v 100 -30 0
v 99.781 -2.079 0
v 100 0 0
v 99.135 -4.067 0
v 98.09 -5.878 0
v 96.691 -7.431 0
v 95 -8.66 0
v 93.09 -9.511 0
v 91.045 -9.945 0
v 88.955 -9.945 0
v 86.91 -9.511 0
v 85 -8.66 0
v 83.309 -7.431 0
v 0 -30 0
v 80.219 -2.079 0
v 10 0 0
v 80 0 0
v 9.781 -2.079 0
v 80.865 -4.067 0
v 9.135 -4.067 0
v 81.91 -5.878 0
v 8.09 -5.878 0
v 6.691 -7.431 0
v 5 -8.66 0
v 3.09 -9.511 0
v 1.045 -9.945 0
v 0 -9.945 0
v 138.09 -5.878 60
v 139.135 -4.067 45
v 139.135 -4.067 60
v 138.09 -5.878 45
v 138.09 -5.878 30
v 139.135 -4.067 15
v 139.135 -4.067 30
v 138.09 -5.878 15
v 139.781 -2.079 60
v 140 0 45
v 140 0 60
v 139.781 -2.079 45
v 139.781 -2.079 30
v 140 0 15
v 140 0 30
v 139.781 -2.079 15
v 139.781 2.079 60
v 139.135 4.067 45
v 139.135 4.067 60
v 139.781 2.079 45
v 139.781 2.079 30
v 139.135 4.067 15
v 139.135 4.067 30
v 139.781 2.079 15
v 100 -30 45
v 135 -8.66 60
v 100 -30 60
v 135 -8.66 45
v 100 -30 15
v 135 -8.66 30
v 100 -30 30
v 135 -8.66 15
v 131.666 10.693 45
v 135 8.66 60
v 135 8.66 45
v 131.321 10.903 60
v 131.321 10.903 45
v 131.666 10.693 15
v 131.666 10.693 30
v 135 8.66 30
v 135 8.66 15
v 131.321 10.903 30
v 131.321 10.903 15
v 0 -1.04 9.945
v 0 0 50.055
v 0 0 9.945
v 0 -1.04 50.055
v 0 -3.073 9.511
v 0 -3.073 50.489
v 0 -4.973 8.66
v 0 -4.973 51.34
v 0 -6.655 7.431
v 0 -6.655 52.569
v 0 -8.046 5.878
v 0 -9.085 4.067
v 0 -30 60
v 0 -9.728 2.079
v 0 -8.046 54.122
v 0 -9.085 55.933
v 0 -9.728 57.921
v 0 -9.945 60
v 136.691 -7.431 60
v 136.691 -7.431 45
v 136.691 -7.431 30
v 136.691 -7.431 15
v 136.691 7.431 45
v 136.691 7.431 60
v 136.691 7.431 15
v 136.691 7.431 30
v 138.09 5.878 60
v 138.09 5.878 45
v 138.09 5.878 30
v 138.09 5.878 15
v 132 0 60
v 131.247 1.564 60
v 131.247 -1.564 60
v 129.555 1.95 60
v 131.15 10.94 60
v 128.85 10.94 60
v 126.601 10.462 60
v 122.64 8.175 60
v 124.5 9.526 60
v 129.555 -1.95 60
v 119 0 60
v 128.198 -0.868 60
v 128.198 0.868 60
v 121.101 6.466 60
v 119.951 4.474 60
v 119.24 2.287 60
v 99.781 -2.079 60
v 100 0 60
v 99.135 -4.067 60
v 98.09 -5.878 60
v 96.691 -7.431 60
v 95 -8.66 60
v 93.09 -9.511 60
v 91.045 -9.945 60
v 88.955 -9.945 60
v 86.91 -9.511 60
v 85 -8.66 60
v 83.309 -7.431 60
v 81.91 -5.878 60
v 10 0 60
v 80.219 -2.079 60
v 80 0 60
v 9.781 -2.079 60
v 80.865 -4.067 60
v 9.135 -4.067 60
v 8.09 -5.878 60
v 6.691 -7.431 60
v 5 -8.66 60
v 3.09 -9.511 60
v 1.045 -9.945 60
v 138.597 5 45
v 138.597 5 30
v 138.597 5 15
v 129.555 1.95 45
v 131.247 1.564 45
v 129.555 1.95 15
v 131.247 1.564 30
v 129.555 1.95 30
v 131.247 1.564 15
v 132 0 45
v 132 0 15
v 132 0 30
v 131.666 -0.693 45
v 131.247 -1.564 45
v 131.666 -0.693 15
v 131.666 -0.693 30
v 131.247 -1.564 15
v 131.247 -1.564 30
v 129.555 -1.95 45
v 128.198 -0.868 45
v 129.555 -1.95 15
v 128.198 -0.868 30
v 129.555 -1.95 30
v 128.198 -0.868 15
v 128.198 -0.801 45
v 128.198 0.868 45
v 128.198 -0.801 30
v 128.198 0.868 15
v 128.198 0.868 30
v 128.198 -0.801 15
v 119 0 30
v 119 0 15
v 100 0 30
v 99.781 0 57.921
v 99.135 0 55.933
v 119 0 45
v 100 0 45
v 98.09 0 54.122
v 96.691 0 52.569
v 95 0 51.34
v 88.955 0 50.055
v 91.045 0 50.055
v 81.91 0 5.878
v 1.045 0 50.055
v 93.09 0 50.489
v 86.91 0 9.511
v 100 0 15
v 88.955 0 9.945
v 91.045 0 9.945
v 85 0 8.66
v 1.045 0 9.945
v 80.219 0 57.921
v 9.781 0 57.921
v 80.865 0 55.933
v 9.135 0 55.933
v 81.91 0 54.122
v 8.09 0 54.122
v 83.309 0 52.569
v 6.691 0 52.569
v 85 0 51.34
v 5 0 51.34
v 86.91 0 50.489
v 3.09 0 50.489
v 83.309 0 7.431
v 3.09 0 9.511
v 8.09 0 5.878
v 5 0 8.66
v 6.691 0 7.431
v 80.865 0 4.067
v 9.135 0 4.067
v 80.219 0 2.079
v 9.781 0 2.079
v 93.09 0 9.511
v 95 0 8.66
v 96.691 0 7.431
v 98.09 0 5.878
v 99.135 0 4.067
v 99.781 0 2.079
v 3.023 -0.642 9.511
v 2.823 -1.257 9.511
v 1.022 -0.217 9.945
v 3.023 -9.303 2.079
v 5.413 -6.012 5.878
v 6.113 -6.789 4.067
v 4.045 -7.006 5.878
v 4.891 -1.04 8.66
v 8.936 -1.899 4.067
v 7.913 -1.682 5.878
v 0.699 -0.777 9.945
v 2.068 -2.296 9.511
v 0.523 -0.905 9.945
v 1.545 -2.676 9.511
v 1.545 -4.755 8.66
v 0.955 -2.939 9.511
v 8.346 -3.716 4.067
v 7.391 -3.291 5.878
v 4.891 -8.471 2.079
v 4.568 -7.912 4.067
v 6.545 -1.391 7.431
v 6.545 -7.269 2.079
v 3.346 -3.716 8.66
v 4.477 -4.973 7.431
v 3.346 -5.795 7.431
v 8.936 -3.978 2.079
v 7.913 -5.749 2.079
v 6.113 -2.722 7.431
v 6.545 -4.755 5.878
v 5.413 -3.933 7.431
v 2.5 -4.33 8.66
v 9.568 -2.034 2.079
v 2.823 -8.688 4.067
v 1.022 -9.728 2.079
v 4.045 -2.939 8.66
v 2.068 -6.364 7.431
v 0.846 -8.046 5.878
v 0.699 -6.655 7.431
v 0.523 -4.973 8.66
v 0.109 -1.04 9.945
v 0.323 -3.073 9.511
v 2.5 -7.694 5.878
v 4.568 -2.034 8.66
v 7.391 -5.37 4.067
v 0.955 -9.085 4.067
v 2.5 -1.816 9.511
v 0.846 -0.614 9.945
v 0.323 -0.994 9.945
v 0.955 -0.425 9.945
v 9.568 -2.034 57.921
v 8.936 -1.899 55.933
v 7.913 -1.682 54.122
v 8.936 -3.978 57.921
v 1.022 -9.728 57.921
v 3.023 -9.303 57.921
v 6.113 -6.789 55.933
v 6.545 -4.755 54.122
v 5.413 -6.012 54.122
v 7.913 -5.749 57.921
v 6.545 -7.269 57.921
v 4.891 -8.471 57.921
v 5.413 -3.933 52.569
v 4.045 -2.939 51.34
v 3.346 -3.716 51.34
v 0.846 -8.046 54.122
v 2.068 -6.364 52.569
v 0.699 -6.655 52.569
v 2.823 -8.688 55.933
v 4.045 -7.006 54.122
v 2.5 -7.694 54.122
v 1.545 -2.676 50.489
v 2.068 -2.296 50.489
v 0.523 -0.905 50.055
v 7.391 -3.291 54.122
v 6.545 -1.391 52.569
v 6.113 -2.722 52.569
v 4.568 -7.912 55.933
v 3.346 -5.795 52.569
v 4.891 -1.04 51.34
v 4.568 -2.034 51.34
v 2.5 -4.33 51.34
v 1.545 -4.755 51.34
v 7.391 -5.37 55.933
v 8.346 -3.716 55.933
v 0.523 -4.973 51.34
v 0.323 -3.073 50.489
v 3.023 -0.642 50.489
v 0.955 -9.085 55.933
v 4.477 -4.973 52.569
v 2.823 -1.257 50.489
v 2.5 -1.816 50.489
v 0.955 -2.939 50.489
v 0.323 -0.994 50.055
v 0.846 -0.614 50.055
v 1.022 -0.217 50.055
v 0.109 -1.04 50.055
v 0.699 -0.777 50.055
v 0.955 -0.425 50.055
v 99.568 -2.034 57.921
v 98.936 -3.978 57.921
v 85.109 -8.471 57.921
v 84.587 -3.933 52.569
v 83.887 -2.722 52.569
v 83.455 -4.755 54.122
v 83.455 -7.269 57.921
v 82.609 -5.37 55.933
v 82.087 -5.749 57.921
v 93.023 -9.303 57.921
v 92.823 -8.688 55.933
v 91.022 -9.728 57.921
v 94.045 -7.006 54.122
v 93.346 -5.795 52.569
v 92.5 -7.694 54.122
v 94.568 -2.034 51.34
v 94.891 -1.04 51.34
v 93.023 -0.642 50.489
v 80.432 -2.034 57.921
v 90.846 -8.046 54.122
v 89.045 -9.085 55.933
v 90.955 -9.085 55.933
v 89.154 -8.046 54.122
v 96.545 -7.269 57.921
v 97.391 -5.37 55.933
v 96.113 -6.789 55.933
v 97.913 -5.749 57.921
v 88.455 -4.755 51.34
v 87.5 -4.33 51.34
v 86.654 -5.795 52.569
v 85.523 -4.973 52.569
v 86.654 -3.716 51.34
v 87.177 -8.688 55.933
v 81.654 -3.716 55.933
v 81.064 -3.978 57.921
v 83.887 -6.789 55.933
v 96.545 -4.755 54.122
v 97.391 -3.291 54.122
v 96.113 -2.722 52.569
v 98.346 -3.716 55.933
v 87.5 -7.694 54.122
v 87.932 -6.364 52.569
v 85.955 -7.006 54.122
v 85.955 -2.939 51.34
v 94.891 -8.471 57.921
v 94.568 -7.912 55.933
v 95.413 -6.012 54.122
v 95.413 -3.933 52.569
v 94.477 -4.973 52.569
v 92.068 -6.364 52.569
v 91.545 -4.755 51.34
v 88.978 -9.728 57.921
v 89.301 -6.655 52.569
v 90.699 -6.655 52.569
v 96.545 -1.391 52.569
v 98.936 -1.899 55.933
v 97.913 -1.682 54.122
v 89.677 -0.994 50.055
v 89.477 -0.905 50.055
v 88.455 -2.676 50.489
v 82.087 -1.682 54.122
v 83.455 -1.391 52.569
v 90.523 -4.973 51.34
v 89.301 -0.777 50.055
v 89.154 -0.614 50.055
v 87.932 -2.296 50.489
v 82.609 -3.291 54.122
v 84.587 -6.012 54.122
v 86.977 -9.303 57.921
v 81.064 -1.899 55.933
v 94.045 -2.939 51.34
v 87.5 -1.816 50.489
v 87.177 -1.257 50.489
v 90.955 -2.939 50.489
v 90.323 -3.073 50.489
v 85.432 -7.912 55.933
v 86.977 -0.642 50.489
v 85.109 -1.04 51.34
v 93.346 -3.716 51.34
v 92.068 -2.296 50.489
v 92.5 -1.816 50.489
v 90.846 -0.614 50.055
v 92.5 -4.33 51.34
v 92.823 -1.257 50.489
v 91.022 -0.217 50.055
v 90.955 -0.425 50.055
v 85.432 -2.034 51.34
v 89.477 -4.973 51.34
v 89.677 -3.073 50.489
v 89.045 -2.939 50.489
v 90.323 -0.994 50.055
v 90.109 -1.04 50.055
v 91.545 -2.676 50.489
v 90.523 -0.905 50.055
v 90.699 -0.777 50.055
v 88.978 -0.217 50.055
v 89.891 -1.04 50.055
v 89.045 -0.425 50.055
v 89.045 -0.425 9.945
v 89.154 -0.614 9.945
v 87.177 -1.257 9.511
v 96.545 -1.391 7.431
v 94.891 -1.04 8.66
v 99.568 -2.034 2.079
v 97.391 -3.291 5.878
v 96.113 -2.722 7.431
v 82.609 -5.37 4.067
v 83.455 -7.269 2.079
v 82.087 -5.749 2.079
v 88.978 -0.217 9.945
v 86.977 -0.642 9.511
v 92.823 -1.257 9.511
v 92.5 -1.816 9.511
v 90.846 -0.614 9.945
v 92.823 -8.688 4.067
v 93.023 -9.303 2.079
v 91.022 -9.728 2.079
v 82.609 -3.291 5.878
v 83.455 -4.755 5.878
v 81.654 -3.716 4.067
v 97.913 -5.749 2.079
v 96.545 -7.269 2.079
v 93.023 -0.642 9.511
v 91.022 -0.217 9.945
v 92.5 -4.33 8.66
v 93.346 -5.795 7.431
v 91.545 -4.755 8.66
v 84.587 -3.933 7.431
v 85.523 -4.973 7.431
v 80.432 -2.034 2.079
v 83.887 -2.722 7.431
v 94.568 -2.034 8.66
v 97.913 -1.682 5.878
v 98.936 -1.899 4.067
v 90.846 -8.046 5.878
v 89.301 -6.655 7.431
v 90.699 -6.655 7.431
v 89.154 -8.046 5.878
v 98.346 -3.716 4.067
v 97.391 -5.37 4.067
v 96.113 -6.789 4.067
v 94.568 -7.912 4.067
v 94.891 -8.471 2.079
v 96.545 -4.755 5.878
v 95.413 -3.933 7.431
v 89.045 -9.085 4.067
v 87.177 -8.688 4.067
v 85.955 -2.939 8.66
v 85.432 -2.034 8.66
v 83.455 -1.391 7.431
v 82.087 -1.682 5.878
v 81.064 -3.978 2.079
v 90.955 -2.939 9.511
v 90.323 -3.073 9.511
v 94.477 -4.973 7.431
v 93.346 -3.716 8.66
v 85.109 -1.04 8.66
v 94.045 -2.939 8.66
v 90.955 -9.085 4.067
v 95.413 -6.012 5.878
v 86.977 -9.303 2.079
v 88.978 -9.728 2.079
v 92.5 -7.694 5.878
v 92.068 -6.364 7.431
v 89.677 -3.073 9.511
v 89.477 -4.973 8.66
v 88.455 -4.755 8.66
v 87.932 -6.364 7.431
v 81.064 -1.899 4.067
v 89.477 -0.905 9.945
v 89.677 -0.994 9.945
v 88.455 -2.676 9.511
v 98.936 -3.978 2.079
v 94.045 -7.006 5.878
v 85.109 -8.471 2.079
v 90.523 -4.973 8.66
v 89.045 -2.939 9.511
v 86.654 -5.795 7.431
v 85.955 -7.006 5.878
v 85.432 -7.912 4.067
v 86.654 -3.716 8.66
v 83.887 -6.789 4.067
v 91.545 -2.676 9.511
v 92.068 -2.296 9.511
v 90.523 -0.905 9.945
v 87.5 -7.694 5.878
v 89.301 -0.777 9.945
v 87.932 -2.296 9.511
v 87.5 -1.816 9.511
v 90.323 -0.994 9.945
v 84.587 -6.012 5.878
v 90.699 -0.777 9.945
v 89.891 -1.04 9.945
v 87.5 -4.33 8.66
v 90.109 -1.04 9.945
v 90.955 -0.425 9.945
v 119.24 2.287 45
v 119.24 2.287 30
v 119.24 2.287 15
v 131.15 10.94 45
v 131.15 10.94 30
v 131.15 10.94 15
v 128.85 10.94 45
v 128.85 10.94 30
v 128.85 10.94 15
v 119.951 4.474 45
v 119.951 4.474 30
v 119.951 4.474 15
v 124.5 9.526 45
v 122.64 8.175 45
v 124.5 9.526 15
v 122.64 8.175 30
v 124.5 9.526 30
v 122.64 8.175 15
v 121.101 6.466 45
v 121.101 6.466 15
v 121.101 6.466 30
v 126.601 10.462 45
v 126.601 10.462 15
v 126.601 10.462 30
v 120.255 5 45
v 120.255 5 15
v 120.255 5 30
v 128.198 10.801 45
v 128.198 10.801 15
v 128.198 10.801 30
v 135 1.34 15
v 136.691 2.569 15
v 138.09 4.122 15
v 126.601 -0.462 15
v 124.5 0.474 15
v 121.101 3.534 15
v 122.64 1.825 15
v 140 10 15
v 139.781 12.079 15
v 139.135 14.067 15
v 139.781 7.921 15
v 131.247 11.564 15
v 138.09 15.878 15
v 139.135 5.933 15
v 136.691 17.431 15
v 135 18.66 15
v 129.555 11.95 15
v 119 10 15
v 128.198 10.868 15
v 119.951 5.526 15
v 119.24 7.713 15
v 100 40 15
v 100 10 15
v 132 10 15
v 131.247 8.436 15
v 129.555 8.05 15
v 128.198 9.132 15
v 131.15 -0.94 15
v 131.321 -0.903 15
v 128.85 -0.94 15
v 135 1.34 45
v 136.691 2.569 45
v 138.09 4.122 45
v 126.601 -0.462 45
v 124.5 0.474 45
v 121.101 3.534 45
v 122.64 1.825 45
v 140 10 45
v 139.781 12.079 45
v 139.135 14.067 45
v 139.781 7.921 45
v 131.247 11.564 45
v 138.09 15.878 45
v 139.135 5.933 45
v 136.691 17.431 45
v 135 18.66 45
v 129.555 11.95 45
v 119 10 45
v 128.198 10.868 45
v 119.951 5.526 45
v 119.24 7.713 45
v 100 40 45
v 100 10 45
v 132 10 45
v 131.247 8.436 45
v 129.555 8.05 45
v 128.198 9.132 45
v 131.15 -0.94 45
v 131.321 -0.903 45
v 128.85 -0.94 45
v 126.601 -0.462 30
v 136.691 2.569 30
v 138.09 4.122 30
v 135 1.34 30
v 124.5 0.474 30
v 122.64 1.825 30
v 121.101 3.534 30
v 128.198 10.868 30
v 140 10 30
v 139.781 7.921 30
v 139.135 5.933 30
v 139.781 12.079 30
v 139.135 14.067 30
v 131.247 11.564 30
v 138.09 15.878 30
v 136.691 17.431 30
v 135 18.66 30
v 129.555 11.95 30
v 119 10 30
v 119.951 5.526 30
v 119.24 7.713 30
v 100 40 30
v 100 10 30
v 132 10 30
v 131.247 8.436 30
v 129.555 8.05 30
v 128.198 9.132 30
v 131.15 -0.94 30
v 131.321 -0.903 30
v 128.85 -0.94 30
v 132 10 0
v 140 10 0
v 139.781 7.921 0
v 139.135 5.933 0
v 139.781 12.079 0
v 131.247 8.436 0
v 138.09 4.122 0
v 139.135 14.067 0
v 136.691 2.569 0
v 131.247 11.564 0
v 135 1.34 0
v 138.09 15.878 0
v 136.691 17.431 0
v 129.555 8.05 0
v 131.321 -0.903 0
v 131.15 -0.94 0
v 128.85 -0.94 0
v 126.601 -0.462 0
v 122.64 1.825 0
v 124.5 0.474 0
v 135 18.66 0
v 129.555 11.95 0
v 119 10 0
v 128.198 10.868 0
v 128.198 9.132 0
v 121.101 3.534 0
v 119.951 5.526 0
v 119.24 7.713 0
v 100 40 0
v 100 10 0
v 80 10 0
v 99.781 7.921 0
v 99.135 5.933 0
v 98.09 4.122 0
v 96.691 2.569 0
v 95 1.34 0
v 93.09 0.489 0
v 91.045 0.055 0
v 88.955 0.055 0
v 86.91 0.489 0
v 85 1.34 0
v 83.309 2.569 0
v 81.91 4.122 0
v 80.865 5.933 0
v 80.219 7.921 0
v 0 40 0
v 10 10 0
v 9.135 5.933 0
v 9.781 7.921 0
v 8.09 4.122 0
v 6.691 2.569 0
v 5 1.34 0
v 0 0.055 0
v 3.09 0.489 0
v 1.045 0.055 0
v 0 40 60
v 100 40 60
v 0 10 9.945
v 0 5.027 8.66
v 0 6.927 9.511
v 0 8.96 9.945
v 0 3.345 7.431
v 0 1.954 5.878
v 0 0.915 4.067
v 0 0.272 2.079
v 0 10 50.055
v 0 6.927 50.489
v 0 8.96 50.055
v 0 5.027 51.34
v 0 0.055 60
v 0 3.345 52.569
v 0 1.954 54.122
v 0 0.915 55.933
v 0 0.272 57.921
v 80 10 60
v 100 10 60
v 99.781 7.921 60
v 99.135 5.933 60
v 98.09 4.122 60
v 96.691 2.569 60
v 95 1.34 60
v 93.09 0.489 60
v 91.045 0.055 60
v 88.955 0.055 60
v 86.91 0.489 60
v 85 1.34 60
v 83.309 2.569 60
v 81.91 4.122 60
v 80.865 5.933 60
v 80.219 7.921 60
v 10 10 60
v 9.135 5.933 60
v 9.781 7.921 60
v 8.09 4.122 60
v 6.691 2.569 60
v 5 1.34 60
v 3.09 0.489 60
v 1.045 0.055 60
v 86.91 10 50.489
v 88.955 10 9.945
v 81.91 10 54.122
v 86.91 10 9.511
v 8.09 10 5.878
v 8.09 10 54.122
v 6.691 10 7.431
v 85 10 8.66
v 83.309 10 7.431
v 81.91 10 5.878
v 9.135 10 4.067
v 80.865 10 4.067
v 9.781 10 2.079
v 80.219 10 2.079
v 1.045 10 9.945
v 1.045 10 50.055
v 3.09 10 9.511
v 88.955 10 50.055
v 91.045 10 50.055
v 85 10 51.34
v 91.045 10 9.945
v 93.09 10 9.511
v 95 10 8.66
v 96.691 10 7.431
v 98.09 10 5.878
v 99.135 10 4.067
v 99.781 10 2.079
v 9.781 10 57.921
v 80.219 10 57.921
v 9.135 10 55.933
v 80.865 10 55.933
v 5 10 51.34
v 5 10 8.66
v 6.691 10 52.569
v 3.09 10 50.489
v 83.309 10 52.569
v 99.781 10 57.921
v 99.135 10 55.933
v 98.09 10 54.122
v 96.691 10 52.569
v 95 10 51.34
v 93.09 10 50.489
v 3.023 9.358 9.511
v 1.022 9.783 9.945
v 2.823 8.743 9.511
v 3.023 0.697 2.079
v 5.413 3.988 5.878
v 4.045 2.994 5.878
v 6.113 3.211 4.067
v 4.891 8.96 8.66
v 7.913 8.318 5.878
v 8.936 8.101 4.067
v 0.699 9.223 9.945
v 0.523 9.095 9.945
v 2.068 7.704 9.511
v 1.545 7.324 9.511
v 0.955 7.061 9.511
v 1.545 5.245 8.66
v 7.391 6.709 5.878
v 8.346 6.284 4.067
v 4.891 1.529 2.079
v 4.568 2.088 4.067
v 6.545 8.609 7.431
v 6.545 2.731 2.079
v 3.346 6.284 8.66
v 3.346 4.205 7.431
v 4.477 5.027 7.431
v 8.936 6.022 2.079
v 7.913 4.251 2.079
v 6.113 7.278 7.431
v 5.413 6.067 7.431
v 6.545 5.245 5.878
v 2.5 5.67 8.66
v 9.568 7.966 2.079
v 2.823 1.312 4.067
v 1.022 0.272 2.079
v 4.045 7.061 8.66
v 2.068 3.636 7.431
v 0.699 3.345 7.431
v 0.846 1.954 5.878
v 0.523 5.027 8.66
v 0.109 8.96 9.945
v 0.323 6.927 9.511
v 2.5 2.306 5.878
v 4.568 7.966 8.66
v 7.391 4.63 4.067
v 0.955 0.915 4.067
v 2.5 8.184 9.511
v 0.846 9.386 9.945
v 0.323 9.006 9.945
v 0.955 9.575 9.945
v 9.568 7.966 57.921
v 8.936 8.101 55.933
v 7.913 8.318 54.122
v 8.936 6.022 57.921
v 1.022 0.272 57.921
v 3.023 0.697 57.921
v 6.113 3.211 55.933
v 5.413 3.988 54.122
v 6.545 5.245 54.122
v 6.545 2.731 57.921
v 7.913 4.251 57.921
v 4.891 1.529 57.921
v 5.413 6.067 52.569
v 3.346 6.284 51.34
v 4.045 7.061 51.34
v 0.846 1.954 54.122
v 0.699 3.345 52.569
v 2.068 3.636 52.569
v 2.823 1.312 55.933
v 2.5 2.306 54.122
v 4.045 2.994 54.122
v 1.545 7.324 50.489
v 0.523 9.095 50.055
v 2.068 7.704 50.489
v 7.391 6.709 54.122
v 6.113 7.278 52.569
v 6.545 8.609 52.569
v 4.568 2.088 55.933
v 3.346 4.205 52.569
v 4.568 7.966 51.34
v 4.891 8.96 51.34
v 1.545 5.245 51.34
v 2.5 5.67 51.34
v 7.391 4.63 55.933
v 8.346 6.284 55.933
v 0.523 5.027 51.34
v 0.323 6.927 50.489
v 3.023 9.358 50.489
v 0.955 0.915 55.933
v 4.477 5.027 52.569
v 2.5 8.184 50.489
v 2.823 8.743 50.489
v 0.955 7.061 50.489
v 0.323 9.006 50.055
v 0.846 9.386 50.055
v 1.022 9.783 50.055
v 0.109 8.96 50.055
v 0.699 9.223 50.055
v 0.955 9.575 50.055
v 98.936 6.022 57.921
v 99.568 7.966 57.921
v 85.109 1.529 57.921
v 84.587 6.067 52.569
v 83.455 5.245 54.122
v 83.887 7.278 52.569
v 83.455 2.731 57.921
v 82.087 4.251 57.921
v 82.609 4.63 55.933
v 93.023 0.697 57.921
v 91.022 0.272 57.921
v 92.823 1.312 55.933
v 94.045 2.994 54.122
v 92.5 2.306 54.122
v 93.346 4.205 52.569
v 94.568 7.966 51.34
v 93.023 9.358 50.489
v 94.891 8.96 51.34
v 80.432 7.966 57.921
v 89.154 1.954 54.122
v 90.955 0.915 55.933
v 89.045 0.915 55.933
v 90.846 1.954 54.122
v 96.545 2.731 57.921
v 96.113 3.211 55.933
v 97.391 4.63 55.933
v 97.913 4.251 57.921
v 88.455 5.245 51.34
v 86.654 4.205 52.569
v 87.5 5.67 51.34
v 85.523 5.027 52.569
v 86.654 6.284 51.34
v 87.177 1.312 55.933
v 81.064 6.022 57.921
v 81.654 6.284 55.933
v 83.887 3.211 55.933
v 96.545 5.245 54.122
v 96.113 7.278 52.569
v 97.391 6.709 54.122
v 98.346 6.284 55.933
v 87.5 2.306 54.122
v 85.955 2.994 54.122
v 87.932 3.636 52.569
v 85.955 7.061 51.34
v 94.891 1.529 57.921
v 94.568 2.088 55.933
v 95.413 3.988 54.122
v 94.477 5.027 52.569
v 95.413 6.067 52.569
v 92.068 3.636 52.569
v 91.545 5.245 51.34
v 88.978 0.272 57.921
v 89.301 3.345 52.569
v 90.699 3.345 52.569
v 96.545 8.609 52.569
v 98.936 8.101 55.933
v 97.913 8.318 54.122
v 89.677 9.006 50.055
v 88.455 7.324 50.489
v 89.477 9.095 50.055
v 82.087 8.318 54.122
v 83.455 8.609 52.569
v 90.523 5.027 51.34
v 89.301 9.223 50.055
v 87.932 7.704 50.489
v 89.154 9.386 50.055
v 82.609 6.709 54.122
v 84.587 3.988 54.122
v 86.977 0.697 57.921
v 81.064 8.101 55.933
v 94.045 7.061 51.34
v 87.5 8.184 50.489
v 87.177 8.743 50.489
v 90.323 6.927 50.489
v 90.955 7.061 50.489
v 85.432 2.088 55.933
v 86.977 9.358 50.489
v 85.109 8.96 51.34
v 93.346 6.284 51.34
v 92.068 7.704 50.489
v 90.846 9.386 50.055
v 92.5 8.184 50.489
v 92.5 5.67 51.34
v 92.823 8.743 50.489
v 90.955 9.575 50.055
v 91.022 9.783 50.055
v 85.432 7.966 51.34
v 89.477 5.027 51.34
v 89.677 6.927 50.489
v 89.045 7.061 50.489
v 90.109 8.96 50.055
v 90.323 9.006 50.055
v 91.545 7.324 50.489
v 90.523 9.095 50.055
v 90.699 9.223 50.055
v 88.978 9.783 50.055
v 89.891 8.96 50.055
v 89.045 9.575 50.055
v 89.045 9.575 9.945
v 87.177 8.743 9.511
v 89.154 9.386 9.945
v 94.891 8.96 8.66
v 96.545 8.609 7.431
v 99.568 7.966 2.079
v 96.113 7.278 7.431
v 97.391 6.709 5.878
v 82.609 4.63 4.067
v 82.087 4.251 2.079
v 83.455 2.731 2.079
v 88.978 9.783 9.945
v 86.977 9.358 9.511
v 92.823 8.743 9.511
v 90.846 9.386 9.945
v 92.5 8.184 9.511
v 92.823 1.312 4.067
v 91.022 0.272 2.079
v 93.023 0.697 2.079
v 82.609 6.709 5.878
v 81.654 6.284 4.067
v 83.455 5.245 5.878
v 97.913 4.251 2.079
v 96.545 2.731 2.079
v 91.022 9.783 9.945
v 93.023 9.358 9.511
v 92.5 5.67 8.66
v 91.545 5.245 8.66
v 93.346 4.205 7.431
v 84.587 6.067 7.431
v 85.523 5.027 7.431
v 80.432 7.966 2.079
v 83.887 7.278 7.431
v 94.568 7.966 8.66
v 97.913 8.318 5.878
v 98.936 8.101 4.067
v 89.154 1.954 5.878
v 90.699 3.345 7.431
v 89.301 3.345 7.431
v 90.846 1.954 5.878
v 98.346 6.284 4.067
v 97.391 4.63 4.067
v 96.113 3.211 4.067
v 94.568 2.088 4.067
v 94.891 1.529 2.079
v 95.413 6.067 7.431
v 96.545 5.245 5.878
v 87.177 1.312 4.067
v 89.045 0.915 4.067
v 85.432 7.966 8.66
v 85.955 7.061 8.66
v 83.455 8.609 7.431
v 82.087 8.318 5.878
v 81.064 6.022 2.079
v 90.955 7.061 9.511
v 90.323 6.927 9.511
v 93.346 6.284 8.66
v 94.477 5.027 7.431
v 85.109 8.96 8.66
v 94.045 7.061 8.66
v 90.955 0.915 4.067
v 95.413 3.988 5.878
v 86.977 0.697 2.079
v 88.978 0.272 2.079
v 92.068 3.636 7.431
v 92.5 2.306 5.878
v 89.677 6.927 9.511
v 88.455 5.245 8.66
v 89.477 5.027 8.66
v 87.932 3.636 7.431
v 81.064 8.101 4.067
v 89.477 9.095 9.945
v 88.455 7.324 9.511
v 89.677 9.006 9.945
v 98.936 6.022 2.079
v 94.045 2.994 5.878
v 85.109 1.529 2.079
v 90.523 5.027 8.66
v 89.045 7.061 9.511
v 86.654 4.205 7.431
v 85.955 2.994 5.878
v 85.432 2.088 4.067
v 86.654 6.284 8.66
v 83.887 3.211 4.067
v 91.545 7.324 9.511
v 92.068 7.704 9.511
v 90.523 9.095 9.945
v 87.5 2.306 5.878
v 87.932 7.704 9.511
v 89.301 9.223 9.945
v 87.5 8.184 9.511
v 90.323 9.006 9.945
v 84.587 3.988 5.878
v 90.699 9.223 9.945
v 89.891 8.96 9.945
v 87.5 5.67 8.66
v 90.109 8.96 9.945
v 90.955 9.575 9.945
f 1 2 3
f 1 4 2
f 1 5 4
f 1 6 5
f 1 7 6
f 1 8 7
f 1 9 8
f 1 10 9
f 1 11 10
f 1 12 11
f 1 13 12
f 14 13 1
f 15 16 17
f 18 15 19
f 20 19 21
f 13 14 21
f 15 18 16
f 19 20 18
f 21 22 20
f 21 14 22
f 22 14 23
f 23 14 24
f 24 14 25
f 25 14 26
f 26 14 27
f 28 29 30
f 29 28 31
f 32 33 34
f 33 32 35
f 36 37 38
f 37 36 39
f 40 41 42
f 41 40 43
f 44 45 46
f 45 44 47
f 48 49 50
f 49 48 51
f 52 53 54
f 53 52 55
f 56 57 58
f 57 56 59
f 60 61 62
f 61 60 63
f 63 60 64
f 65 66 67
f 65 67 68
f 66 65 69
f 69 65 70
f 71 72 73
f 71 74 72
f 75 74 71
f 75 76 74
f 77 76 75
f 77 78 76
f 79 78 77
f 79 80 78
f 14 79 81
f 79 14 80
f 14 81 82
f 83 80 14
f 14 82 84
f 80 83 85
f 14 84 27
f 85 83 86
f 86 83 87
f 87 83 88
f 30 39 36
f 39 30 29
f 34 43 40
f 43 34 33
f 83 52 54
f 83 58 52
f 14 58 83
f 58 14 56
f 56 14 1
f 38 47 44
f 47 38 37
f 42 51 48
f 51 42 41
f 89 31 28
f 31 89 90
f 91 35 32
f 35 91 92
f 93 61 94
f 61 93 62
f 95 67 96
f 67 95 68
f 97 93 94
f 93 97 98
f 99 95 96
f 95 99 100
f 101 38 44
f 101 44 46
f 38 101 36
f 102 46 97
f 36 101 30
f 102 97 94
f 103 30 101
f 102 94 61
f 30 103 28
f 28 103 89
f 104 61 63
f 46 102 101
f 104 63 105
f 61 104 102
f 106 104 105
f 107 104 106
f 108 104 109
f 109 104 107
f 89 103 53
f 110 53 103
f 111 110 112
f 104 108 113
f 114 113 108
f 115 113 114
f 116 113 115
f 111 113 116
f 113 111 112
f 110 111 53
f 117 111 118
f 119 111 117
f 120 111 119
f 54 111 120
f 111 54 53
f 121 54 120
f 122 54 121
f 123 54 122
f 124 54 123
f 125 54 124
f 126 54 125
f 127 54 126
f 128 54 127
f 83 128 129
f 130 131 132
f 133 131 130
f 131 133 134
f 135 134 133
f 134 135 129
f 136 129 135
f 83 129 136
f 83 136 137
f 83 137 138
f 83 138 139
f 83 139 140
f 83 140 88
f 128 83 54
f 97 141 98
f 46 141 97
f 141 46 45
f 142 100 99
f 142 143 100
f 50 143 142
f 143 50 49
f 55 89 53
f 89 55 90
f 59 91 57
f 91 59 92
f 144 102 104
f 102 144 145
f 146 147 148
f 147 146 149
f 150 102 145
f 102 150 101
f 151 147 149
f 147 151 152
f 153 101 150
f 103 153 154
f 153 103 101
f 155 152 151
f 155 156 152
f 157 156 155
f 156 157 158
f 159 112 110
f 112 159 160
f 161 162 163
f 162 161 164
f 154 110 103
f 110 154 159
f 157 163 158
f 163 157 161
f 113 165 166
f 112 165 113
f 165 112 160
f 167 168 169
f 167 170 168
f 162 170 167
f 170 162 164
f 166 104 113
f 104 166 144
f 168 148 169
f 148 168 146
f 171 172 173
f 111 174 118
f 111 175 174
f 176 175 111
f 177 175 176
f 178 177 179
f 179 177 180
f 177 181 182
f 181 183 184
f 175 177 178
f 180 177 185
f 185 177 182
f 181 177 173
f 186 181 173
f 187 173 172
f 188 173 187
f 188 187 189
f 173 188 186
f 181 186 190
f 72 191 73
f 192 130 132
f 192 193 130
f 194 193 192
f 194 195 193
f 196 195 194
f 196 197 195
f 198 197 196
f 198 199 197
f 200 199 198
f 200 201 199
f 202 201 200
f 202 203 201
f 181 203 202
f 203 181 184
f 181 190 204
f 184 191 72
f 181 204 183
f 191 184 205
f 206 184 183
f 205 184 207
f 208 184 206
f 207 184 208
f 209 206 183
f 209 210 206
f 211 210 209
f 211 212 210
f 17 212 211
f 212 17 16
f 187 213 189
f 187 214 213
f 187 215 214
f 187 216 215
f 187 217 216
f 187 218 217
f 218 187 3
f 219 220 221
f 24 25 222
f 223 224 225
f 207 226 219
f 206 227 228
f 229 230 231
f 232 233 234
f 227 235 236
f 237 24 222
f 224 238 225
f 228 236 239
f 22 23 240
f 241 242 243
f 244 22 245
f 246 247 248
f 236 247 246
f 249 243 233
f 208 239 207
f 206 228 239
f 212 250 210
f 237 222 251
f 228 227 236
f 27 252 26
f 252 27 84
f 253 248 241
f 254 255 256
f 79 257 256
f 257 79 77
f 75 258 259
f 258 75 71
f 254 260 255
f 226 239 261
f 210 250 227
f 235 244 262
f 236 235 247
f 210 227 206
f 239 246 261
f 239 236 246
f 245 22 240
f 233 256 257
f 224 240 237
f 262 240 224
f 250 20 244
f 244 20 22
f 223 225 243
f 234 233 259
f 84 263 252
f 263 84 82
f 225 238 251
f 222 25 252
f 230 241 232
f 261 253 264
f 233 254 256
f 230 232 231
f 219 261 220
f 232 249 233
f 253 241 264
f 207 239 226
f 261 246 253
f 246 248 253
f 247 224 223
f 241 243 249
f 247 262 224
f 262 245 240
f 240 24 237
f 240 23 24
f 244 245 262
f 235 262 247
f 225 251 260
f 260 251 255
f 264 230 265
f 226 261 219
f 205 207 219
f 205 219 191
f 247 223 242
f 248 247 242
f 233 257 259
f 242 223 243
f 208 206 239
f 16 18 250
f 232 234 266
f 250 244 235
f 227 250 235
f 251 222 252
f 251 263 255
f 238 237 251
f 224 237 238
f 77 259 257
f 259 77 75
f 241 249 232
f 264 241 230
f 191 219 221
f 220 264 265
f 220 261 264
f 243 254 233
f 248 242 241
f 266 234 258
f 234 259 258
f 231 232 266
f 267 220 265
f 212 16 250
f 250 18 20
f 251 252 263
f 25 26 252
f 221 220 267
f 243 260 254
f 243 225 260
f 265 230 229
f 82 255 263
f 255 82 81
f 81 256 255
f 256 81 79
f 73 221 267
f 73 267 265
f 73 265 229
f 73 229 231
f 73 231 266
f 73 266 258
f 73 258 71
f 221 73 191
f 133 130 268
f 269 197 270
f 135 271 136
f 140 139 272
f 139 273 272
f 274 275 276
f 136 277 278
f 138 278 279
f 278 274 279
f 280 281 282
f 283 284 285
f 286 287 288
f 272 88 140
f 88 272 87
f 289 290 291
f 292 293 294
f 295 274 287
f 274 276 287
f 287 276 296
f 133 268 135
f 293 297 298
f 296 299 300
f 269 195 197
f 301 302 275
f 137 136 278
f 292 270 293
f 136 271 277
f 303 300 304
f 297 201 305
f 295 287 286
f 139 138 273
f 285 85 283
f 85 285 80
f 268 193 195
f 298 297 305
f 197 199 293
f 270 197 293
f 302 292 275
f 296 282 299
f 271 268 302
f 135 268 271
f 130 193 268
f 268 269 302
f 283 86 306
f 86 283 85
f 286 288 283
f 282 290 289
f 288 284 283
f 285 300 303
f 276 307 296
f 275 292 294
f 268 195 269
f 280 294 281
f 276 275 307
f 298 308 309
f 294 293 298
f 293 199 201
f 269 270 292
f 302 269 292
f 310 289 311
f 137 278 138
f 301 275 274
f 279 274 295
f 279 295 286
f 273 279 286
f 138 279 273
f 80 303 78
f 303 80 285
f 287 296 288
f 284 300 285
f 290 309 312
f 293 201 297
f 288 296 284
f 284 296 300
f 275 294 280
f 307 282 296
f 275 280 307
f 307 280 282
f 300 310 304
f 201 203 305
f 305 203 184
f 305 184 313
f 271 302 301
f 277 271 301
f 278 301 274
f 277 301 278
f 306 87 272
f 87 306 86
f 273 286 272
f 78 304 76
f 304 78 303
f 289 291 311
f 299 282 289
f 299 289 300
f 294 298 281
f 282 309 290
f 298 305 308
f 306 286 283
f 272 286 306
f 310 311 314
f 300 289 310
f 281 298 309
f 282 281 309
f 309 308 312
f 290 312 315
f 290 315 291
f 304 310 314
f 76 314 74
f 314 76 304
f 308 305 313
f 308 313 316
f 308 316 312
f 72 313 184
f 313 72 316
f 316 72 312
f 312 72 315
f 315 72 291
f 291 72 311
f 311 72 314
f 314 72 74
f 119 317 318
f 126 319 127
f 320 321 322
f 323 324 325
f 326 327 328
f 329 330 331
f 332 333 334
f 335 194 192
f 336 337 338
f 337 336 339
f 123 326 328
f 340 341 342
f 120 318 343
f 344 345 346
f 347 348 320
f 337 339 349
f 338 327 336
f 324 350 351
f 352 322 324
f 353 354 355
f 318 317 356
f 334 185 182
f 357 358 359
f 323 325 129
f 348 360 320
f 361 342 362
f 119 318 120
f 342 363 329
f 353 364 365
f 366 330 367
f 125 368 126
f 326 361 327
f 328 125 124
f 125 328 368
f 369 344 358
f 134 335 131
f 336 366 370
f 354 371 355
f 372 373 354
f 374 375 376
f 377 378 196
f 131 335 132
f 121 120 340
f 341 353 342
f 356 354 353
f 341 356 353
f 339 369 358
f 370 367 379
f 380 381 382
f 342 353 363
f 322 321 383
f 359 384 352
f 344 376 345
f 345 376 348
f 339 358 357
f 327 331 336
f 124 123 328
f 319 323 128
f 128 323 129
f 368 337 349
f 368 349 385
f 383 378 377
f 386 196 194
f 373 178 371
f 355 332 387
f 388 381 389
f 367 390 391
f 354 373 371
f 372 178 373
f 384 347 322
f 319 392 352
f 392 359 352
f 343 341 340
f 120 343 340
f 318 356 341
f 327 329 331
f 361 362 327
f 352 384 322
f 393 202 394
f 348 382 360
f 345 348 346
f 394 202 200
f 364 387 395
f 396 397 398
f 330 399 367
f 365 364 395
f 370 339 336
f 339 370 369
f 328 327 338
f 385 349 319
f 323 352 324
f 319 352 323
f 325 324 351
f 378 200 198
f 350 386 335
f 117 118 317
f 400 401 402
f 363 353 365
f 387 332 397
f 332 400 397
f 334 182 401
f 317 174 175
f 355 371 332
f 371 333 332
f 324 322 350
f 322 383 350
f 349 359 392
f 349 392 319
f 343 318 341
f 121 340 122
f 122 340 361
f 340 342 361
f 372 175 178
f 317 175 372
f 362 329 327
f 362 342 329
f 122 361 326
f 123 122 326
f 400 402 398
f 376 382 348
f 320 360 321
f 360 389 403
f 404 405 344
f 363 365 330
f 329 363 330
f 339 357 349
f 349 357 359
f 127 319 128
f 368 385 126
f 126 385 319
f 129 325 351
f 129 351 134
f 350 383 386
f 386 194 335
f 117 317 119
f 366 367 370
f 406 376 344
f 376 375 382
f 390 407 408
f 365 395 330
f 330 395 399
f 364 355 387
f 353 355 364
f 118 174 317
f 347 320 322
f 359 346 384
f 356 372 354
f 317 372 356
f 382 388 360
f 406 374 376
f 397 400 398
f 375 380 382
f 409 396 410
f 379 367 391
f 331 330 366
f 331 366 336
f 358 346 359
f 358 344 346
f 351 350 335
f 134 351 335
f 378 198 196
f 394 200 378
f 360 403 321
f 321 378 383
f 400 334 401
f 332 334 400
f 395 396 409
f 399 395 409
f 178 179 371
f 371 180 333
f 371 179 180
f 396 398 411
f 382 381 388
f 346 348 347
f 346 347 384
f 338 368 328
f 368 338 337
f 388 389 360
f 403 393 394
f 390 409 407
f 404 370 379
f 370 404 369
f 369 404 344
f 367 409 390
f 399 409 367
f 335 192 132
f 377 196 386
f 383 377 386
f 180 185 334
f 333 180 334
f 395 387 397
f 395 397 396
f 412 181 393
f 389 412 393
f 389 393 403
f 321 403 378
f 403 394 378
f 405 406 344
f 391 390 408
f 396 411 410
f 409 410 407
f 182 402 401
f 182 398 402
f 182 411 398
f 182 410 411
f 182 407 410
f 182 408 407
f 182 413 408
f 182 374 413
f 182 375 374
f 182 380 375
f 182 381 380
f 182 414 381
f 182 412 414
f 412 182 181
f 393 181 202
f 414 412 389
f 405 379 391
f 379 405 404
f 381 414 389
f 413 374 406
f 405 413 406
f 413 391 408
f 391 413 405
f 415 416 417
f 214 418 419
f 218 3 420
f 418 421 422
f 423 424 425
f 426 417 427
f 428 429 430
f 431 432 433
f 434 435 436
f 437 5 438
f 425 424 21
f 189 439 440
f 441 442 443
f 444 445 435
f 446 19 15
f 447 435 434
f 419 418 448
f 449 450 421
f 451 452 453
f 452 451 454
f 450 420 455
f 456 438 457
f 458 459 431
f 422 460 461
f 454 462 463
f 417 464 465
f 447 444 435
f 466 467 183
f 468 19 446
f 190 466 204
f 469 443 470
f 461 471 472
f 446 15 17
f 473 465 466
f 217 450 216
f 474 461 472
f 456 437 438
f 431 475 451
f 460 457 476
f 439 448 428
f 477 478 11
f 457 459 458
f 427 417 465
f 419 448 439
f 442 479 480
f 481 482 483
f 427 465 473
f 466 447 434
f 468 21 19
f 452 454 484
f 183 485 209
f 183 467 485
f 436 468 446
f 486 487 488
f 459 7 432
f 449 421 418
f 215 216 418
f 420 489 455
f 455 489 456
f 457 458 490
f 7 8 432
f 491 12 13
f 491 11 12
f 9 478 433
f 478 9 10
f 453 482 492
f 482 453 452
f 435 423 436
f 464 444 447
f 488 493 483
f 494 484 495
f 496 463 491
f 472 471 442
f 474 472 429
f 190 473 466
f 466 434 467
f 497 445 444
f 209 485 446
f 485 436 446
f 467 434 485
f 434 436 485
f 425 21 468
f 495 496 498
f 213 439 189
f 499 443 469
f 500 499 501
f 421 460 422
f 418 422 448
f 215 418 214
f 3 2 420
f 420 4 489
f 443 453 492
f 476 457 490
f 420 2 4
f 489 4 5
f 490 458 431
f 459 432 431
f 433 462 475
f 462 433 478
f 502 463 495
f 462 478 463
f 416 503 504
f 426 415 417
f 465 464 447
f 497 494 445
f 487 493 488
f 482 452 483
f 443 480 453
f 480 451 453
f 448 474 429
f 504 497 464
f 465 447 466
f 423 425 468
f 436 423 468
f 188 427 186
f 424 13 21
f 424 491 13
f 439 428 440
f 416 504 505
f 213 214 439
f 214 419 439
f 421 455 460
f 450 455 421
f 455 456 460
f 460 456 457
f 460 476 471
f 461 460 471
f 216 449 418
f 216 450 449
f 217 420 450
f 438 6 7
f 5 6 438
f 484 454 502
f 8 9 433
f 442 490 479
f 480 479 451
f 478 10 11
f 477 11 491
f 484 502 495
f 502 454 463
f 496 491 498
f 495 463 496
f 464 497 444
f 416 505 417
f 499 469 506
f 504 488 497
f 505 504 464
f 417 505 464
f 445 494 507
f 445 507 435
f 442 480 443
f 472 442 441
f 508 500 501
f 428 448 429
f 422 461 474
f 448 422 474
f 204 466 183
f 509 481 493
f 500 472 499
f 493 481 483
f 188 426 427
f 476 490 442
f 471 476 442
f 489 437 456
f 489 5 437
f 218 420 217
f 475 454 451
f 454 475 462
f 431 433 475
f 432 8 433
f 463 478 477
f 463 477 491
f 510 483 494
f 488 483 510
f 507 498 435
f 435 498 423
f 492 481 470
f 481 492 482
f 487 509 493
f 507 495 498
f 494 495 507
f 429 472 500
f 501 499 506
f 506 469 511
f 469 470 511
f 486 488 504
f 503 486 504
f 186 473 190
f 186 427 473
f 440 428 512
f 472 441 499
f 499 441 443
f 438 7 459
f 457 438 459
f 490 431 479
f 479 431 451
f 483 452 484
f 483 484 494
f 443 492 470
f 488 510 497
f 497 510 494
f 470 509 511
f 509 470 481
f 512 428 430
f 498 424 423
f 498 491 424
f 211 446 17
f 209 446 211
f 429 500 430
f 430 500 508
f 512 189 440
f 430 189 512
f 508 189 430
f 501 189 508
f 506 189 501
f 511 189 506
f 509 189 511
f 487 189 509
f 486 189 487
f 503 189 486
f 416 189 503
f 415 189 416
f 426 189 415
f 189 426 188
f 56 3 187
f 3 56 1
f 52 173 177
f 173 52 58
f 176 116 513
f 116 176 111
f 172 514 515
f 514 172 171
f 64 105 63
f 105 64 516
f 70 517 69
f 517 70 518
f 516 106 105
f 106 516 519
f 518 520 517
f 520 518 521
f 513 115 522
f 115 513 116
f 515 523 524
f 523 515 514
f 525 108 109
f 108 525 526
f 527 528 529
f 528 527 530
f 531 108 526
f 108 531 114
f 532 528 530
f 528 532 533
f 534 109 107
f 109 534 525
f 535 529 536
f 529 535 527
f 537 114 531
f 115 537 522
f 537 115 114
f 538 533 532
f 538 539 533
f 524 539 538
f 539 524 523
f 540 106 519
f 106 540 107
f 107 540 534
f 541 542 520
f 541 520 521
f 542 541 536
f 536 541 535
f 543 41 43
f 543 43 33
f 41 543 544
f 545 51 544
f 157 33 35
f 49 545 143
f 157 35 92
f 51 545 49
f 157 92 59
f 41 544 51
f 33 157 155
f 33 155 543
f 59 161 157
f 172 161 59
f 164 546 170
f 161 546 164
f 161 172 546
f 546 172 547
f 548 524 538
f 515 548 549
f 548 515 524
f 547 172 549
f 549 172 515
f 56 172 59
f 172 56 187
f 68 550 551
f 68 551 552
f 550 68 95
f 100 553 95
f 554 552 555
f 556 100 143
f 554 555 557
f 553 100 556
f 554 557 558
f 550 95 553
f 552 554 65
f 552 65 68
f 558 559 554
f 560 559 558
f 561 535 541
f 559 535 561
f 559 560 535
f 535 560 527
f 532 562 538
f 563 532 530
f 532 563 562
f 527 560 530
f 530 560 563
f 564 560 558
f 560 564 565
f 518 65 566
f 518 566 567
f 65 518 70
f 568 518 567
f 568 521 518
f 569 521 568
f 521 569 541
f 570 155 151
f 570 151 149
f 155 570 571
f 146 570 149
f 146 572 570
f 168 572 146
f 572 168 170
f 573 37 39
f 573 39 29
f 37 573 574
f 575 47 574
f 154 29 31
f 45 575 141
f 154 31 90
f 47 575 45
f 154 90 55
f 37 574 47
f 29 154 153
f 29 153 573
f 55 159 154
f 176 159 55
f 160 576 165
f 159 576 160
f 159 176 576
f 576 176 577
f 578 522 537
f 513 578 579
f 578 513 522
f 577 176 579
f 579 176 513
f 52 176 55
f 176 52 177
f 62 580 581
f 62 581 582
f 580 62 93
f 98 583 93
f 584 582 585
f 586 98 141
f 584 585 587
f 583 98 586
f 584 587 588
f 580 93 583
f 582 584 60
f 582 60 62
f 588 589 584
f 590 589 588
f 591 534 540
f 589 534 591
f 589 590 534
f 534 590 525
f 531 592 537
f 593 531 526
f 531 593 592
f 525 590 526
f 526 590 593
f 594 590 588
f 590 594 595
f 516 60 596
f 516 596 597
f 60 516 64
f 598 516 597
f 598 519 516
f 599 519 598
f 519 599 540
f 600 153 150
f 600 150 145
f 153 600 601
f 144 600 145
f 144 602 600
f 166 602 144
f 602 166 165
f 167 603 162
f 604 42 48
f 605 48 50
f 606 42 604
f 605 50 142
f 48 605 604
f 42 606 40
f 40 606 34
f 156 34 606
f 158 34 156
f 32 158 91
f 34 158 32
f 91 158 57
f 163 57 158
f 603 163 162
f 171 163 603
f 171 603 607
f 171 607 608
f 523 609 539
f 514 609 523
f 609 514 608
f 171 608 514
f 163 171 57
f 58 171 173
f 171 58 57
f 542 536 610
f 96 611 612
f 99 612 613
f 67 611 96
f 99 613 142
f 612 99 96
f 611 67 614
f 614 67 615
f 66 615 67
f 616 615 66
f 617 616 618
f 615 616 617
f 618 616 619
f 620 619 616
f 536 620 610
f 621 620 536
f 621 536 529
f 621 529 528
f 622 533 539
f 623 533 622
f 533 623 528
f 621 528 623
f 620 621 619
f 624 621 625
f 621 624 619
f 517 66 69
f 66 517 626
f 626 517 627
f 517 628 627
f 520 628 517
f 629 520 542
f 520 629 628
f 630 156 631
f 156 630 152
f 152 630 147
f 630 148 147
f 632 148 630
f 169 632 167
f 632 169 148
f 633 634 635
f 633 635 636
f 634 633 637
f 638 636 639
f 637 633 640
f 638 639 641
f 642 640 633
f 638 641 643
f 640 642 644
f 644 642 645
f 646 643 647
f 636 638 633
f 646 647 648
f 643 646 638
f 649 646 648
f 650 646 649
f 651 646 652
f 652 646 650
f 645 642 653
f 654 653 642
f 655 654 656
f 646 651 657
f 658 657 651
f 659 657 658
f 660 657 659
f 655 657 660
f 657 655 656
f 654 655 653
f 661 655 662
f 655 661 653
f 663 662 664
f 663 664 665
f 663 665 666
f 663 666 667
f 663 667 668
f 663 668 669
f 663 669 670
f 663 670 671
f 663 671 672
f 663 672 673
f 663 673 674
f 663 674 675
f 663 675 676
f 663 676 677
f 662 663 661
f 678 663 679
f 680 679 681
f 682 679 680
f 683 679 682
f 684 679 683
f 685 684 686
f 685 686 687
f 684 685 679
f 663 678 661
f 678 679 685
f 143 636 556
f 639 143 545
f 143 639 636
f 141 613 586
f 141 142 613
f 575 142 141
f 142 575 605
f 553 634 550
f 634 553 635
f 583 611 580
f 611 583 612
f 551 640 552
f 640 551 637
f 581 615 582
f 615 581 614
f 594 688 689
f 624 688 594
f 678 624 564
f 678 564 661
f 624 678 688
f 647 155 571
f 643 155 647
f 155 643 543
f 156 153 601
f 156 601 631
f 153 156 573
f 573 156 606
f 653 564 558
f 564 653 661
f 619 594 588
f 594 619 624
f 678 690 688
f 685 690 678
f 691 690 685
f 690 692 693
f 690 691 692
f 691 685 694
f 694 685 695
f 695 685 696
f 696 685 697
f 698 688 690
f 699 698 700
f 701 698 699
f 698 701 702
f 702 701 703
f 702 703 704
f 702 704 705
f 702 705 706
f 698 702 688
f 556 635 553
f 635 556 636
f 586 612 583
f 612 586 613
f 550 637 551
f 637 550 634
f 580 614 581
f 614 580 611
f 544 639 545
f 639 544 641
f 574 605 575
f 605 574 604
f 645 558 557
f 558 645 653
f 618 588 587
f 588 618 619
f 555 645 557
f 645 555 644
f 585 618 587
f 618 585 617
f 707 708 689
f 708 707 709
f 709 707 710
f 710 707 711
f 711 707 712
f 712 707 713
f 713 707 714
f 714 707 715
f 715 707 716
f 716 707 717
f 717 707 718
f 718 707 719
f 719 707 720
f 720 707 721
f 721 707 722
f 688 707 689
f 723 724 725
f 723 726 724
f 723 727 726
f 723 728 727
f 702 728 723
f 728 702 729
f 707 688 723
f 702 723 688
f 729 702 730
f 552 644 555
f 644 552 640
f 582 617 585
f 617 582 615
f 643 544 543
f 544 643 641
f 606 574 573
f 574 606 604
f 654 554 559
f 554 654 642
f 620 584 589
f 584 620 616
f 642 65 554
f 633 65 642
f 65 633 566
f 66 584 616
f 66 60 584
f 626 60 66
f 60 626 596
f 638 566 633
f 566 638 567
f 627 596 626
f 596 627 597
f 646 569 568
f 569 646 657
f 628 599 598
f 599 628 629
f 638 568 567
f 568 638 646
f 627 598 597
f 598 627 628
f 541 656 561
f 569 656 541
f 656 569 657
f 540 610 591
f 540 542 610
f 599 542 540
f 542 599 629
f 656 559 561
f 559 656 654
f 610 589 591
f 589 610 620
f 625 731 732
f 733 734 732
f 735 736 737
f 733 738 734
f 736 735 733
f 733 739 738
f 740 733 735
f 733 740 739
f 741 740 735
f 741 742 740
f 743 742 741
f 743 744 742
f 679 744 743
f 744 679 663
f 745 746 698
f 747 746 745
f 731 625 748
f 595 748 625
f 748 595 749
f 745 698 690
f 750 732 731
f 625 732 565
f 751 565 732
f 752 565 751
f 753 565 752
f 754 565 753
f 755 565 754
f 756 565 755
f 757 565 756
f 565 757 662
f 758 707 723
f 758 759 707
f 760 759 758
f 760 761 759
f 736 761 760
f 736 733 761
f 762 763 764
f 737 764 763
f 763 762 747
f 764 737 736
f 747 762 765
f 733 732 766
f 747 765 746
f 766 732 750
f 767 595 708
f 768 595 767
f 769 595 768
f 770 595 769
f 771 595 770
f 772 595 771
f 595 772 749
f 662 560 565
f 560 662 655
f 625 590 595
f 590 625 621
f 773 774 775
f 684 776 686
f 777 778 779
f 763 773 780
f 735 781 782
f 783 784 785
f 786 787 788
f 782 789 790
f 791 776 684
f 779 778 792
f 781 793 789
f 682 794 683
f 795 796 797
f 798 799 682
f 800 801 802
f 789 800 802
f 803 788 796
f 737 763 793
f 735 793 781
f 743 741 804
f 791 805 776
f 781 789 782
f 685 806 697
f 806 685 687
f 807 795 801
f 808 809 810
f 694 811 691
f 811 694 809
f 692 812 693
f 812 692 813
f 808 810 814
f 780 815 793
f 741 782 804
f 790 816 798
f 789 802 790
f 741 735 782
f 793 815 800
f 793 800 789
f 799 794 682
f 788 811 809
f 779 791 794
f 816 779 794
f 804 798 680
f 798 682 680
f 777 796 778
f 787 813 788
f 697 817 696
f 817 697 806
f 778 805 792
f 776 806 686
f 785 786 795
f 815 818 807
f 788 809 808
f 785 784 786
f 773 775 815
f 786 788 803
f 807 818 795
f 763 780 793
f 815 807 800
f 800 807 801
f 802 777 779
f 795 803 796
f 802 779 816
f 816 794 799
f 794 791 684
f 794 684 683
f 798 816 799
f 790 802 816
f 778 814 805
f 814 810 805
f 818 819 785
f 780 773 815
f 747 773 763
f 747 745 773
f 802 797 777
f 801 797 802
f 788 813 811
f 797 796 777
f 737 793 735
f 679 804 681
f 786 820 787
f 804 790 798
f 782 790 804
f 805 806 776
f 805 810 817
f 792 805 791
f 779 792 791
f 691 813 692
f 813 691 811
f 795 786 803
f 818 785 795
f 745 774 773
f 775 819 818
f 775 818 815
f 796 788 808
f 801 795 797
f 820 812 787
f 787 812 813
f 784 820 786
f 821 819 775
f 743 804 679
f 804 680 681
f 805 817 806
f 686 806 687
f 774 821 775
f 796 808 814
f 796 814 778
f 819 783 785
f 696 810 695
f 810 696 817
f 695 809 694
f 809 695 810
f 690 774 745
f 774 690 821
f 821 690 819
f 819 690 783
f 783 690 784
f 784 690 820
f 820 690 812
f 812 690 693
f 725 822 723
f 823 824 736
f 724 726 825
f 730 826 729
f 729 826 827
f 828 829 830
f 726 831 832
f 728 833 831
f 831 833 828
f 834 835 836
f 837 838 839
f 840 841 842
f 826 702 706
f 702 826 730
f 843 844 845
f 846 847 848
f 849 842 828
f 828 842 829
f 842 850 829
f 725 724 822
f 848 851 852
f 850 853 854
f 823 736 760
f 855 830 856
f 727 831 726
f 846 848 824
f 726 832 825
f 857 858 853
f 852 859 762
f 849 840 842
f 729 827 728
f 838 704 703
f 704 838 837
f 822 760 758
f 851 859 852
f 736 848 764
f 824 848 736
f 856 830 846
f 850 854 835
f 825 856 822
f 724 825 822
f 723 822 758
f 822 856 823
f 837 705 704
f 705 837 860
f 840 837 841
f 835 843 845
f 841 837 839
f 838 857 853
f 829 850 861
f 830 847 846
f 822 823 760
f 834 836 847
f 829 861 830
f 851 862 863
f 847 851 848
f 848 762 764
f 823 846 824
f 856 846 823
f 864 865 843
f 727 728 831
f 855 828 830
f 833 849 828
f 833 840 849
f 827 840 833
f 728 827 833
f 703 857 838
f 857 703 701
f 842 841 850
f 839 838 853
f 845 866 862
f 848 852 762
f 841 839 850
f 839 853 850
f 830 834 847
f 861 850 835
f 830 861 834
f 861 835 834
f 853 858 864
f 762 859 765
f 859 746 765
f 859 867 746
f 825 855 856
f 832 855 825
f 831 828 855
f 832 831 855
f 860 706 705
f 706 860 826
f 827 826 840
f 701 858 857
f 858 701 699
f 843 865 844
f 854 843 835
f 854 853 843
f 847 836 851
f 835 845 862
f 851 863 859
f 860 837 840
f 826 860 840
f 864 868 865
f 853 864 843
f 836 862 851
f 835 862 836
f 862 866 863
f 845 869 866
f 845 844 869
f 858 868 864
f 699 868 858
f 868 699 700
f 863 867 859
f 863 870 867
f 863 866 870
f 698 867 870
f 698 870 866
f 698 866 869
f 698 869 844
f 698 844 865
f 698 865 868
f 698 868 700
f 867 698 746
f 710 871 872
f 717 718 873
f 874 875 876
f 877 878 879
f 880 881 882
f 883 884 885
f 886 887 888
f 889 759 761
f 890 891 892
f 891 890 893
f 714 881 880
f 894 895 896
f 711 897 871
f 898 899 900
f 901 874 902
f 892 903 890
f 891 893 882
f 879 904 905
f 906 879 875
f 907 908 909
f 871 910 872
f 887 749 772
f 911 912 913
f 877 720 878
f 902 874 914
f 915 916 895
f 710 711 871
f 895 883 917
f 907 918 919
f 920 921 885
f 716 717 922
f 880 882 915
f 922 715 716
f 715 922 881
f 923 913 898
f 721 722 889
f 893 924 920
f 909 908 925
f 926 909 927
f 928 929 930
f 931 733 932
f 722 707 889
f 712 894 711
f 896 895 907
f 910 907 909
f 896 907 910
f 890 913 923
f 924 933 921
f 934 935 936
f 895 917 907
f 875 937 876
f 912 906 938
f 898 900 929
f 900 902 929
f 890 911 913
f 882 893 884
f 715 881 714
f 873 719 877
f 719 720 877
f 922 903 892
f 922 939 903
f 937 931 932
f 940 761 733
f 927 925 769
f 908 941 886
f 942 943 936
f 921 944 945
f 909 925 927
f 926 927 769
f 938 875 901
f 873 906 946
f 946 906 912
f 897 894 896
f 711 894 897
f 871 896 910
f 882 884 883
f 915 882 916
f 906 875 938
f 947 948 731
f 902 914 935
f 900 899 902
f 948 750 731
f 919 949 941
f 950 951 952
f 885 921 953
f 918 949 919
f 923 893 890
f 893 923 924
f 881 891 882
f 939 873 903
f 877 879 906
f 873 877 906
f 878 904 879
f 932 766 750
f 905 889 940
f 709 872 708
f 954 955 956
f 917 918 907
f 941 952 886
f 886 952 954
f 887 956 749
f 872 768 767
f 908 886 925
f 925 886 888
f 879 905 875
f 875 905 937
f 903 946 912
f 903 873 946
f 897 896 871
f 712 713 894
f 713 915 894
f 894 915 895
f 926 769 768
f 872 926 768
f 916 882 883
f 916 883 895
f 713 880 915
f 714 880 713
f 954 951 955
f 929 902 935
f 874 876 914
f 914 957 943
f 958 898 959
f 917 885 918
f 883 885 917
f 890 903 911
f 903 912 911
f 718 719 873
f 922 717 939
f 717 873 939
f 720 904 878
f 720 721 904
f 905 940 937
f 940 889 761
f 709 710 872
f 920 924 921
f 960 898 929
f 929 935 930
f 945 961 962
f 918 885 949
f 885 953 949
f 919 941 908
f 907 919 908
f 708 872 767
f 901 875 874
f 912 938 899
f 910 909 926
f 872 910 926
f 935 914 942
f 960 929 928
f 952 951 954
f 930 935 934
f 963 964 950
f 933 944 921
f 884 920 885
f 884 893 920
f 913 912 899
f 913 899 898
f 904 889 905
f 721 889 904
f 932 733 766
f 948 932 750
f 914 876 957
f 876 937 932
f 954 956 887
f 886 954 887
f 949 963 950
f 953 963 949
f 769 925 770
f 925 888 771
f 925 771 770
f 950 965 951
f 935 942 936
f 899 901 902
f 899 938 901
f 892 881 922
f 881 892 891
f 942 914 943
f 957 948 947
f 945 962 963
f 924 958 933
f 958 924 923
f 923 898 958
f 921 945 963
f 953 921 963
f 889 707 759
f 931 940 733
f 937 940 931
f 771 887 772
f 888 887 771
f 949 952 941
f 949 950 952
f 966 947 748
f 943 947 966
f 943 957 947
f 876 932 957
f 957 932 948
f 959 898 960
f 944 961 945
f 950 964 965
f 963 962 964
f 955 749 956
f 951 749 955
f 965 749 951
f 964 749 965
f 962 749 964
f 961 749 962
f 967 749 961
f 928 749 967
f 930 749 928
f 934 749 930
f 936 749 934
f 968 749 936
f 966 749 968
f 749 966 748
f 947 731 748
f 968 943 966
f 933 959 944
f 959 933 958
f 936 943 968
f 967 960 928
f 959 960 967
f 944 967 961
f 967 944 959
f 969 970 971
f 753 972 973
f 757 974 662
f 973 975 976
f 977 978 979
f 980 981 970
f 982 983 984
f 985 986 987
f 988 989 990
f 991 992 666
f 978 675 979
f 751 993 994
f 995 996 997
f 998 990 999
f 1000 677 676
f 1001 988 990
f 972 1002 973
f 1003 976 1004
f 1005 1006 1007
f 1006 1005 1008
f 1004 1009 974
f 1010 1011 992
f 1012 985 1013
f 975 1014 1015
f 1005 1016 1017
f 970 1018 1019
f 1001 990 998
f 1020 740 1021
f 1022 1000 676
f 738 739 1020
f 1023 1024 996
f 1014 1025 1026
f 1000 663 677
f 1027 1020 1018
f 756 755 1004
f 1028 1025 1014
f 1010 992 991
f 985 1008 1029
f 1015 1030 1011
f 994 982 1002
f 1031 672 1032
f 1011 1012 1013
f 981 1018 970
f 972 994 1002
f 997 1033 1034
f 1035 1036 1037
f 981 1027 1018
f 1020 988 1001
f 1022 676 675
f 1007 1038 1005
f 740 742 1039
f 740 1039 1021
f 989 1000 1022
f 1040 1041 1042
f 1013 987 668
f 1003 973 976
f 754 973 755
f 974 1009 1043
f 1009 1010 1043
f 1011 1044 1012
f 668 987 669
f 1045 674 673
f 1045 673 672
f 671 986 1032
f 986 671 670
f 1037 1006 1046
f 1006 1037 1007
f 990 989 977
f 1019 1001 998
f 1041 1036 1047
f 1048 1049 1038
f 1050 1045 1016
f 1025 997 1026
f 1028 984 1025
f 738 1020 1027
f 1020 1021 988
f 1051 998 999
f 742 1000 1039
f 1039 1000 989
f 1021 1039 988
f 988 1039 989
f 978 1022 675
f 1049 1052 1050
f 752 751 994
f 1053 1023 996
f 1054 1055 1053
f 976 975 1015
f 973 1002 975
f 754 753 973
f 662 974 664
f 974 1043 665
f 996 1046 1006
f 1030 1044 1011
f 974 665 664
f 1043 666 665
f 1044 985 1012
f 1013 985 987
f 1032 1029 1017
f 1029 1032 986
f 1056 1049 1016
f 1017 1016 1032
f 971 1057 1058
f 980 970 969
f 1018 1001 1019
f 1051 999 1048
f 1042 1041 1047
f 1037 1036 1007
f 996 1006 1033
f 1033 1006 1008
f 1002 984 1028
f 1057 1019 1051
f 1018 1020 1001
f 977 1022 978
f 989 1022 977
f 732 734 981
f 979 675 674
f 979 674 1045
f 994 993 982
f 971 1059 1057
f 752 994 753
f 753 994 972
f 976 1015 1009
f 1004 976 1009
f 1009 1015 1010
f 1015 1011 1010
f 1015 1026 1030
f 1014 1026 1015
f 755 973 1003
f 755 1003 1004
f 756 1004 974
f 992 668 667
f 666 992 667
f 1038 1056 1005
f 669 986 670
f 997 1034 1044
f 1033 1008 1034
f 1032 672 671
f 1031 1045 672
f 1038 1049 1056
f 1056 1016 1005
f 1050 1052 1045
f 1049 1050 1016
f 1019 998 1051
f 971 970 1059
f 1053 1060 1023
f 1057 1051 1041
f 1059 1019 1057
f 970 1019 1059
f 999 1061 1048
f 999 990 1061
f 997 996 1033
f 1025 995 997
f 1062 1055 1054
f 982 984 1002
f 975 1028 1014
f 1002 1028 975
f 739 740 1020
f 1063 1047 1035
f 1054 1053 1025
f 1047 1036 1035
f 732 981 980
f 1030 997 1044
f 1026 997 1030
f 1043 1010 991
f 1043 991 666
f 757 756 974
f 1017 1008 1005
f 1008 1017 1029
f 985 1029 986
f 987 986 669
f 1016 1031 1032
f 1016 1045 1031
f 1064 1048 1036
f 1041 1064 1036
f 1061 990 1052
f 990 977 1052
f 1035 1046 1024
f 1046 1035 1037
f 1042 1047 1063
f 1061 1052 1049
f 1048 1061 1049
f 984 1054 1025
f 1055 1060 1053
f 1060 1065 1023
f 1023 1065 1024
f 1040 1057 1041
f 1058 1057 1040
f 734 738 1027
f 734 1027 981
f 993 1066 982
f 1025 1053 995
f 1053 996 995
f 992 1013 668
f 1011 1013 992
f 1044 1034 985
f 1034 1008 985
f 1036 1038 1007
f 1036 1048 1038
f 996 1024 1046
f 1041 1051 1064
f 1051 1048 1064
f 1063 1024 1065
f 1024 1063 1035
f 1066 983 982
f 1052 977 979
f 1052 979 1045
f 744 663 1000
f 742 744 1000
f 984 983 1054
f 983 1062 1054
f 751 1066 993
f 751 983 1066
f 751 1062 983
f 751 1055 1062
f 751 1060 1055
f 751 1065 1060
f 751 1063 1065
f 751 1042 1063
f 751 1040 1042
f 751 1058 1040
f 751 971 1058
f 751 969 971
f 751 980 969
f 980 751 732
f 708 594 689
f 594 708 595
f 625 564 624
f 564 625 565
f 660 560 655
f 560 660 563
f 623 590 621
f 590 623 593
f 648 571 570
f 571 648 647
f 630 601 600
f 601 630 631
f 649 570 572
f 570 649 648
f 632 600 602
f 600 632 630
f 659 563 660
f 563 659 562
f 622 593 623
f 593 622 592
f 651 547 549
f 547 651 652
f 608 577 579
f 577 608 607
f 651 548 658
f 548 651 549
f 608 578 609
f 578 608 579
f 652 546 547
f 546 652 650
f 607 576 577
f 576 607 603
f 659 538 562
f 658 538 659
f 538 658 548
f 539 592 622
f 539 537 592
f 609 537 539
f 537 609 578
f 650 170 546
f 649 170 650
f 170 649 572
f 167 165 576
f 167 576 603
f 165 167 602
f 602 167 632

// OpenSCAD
largeur=60;
longueur=100;
hauteur=60;
offset_penture=30;
rayon_penture=10;
rayon_goupille=2;
rayon_enligneur=10;


module corps(largeur=60,longueur=100,hauteur=60,
offset_penture=30,rayon_penture=10,rayon_goupille=2)
{
    difference(){
        hull(){
            translate([0,-largeur/2,0]) cube([longueur,largeur,hauteur]);
            translate([longueur+offset_penture,0,0]) 
                cylinder(hauteur,r=rayon_penture);
            
        }
        translate([longueur+offset_penture,0,-1]) 
            cylinder(hauteur+2,r=rayon_goupille);
    }
}    
 
module masquePentureGauche(longueur,largeur,hauteur,position){
    translate(position){
        translate([0,0,-1]) 
            cube([longueur+1,largeur+2,(hauteur/4)+1]);
        translate([0,0,(hauteur/2)])
            cube([longueur+1,largeur+2,(hauteur/4)]);
        difference(){
        translate([0,largeur/2+1,-1]) cube([longueur+1,largeur/2+1,hauteur+2]);
        translate([offset_penture,largeur/2+1,-2]) 
                cylinder(hauteur+4,r=rayon_penture+1);
        }
    }
}

module masquePentureDroite(longueur,largeur,hauteur,position){
        rotate([180,0,0]) translate([0,0,-hauteur]) masquePentureGauche(longueur,largeur,hauteur,position);
    }

    //corps();
module masqueMoule(){
    union(){
        translate([-1,0,-1]) cube([longueur+2,largeur,hauteur+2]);
        sphere(rayon_enligneur);
        translate([0,0,hauteur])sphere(rayon_enligneur);
        translate([longueur-rayon_enligneur,0,hauteur])sphere(rayon_enligneur);
        translate([longueur-rayon_enligneur,0,0])sphere(rayon_enligneur);
        
    }
}
module mouleGauche(){
    difference(){
        corps();
        masqueMoule();
        masquePentureGauche(offset_penture+rayon_penture,largeur,hauteur,[longueur,-largeur/2-1,0]);
        }
    }
module mouleDroit(){
    difference(){
        corps();
        difference(){
                   translate([-2,-largeur,-2]) cube([longueur+4,largeur,hauteur+4]);
                   masqueMoule();
 
            }
        masquePentureDroite(offset_penture+rayon_penture,largeur,hauteur,[longueur,-largeur/2-1,0]);
    }
}
render(6) color("red") mouleGauche();
translate([0,10,0]) mouleDroit();
//masquePentureGauche(offset_penture+rayon_penture,largeur,hauteur,[0,0,0]);
